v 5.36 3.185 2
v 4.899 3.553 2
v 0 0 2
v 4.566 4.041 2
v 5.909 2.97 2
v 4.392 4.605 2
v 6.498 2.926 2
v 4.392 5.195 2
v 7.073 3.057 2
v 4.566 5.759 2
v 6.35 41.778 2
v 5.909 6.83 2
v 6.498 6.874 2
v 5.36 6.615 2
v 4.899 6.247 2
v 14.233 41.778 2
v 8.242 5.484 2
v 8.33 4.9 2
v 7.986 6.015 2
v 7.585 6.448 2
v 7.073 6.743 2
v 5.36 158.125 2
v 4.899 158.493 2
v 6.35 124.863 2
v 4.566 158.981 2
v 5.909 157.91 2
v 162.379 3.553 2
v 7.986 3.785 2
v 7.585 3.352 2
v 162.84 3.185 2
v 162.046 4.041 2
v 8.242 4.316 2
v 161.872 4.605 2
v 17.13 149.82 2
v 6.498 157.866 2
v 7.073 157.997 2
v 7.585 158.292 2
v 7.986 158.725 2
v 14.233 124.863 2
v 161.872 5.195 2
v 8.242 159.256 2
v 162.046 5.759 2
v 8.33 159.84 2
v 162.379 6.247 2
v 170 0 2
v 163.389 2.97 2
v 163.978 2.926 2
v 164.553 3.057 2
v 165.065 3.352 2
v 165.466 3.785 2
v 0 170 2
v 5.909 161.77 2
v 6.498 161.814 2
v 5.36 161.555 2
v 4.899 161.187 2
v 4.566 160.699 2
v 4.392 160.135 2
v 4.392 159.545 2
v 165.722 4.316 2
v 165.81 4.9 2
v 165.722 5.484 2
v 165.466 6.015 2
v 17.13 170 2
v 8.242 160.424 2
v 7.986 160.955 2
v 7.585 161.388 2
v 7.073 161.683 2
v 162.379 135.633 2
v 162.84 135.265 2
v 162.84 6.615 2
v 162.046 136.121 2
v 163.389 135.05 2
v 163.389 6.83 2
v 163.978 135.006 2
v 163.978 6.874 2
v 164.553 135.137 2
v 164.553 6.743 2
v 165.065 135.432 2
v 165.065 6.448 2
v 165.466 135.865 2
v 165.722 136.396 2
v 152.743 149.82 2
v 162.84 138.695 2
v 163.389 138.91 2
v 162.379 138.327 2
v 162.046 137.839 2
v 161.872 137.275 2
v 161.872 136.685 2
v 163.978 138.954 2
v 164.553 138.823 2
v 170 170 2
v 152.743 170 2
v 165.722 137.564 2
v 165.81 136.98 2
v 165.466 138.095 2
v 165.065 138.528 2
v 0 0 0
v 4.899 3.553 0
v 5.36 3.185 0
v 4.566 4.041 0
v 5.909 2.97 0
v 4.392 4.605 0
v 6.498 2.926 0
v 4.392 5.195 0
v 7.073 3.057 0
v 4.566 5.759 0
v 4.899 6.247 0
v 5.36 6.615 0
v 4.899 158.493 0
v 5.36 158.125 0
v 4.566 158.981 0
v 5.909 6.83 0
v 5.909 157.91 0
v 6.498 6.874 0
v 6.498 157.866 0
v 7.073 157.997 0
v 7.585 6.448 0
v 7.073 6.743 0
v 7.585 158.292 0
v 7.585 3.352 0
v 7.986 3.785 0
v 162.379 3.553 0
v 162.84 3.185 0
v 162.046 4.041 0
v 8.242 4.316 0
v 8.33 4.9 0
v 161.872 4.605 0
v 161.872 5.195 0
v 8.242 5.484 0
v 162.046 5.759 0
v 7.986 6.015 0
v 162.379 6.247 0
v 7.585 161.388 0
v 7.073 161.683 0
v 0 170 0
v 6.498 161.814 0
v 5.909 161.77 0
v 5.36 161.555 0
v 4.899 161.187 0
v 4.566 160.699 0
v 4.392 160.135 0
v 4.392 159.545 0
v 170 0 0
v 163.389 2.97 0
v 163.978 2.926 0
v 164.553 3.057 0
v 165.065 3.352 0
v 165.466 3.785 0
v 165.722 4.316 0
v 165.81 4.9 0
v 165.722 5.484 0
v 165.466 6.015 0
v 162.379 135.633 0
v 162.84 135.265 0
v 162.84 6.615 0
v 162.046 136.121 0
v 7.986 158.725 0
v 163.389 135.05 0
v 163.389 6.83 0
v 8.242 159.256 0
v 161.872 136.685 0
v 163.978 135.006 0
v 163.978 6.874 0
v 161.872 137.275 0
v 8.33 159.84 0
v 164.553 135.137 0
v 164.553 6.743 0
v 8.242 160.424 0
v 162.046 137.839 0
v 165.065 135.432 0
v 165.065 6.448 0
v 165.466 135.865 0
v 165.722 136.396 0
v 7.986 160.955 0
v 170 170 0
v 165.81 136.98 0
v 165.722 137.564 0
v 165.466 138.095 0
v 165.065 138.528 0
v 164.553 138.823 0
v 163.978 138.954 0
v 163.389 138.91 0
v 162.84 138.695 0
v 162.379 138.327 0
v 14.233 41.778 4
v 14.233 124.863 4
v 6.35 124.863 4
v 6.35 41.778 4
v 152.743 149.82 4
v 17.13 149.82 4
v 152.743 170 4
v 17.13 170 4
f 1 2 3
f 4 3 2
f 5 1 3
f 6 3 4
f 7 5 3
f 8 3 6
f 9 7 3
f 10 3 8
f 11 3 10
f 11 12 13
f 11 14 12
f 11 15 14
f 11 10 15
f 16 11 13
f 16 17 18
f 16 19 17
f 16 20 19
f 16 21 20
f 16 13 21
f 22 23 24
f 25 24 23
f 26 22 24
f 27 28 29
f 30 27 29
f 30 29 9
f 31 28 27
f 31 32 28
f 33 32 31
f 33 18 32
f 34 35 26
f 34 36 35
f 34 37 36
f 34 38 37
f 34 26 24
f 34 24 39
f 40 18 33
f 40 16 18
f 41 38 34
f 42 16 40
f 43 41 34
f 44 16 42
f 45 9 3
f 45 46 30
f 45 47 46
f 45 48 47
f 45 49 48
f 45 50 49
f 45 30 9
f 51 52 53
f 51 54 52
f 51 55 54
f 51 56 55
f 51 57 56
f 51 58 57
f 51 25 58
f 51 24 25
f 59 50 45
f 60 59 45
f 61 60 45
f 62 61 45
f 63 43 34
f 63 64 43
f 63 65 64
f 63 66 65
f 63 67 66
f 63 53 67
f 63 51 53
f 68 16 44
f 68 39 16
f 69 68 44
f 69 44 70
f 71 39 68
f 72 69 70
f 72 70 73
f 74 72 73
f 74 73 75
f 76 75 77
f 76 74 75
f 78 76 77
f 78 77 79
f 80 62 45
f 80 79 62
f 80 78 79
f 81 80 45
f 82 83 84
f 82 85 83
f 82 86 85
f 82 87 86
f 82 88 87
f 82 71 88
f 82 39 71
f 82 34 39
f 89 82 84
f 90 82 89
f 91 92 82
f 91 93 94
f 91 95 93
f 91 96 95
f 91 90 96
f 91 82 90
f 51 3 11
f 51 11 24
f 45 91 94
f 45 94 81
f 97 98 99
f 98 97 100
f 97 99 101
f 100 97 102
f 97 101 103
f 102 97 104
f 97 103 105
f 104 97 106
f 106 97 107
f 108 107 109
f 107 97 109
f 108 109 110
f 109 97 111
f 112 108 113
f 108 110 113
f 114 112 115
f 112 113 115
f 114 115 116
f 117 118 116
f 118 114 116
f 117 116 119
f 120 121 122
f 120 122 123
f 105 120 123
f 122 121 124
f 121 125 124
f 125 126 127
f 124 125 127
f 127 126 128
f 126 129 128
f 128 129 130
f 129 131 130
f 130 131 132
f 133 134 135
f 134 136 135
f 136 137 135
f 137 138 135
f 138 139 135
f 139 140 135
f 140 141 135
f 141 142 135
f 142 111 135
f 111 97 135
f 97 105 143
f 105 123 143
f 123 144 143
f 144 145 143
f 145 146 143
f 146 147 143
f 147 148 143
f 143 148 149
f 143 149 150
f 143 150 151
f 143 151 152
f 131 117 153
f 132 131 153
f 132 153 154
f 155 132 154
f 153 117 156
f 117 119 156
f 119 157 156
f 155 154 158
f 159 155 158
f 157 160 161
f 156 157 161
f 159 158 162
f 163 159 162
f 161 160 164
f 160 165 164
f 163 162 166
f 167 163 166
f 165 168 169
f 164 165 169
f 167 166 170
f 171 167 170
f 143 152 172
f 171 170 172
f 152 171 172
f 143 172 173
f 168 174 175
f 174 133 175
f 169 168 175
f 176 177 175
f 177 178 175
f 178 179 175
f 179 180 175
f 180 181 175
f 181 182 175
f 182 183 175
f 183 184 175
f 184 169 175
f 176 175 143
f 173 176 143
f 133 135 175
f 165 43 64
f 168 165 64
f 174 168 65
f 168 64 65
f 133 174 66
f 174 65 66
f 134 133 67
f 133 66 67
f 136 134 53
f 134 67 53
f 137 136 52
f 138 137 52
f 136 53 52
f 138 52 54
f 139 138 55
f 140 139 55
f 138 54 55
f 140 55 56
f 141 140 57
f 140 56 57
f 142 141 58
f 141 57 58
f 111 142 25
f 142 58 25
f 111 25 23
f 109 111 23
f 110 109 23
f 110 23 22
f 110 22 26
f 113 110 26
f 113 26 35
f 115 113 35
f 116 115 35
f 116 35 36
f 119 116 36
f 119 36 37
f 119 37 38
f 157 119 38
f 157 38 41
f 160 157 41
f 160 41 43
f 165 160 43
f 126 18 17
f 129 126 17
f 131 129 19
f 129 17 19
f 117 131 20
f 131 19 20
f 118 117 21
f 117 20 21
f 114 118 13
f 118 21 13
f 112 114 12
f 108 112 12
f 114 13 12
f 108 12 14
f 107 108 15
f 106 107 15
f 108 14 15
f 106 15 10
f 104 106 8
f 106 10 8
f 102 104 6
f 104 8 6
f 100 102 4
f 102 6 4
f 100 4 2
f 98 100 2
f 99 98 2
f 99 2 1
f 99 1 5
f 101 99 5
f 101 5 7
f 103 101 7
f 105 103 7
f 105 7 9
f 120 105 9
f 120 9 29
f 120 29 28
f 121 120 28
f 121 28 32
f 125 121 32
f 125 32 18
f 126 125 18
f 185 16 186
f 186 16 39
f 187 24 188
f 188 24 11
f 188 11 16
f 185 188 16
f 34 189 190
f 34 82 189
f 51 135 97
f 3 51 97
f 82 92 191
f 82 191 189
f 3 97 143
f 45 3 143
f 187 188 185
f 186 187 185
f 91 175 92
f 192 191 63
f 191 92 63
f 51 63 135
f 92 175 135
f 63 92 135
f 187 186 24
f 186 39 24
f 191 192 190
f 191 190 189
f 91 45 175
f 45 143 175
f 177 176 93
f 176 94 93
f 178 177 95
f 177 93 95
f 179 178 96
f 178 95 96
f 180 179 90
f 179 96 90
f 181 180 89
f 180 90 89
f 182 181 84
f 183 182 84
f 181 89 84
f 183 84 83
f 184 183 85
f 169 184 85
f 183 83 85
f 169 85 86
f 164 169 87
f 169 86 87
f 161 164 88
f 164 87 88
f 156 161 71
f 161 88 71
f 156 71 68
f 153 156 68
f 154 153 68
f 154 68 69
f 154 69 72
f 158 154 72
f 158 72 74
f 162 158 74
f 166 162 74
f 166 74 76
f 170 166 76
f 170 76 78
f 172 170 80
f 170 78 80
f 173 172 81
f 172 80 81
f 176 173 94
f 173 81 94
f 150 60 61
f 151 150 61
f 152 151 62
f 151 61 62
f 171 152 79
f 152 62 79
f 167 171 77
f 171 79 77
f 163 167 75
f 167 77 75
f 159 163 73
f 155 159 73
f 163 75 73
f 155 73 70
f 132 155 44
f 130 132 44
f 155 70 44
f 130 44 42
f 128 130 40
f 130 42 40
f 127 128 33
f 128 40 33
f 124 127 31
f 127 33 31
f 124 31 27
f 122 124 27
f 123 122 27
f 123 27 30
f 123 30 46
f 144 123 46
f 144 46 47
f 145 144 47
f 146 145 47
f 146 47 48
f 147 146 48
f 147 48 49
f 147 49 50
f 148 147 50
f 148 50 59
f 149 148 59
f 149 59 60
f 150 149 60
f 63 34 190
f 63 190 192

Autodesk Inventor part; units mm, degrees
ref_plane "YZ Plane" through (0, 0, 0) normal (1, 0, 0) x (0, 1, 0)
ref_plane "XZ Plane" through (0, 0, 0) normal (0, 1, 0) x (-1, 0, 0)
ref_plane "XY Plane" through (0, 0, 0) normal (0, 0, 1) x (1, 0, 0)
sketch "Sketch1" plane through (0, 0, 0) normal (0, 0, 1) x (1, 0, 0)
  line L0 (0, 0) -> (170, 0)
  line L1 (170, 0) -> (170, 170)
  line L2 (170, 170) -> (0, 170)
  line L3 (0, 170) -> (0, 0)
  dimension "d0" = 170
  dimension "d1" = 170
extrude "Extrusion1" add sketch "Sketch1" along normal blind 2
sketch "Sketch2" plane through (0, 0, 2) normal (0, 0, 1) x (1, 0, 0)
  line L0 (170, 170) -> (0, 170) projected
  line L1 (0, 170) -> (0, 0) projected
  line L2 (0, 170) -> (0, 159.84) construction
  line L3 (0, 159.84) -> (6.35, 159.84) construction
  line L4 (6.35, 170) -> (163.83, 170) construction
  line L5 (163.83, 170) -> (163.83, 136.98) construction
  line L6 (6.35, 159.84) -> (6.35, 4.9) construction
  line L7 (6.35, 4.9) -> (163.83, 4.9) construction
  circle A0 centre (6.35, 159.84) radius 1.98
  circle A1 centre (163.83, 136.98) radius 1.98
  circle A2 centre (6.35, 4.9) radius 1.98
  circle A3 centre (163.83, 4.9) radius 1.98
  dimension "d4" = 10.16
  dimension "d5" = 6.35
  dimension "d6" = 157.48
  dimension "d7" = 33.02
  dimension "d8" = 154.94
  dimension "d9" = 3.96
  dimension "d10" = 3.96
  dimension "d11" = 3.96
  dimension "d12" = 3.96
extrude "Extrusion2" cut sketch "Sketch2" against normal blind 2
sketch "Sketch3" plane through (0, 0, 2) normal (0, 0, 1) x (1, 0, 0)
  line L0 (14.2327, 124.8626) -> (6.35, 124.8626)
  line L1 (6.35, 124.8626) -> (6.35, 41.7782)
  line L2 (6.35, 41.7782) -> (14.2327, 41.7782)
  line L3 (14.2327, 41.7782) -> (14.2327, 124.8626)
extrude "Extrusion3" add sketch "Sketch3" along normal blind 2
sketch "Sketch4" plane through (0, 0, 4) normal (0, 0, 1) x (1, 0, 0)
  line L0 (14.2327, 124.8626) -> (6.35, 124.8626) projected
  line L1 (6.35, 124.8626) -> (6.35, 41.7782) projected
  line L2 (6.35, 41.7782) -> (14.2327, 41.7782) projected
  line L3 (14.2327, 41.7782) -> (14.2327, 124.8626) projected
  line L4 (12.3491, 93.2345) -> (12.3491, 74.2867) construction
  line L5 (12.3491, 74.2867) -> (8.2093, 74.2867) construction
  line L6 (8.2093, 74.2867) -> (8.2093, 93.2345) construction
  line L7 (8.2093, 93.2345) -> (12.3491, 93.2345) construction
  point P0 (0, 0)
sketch "Sketch5" plane through (0, 0, 2) normal (0, 0, 1) x (1, 0, 0)
  line L0 (170, 170) -> (0, 170) projected
  line L1 (17.1297, 170) -> (152.7432, 170)
  line L2 (152.7432, 170) -> (152.7432, 149.8199)
  line L3 (152.7432, 149.8199) -> (17.1297, 149.8199)
  line L4 (17.1297, 149.8199) -> (17.1297, 170)
extrude "Extrusion4" add sketch "Sketch5" along normal blind 2
sketch "Sketch6" plane through (0, 0, 4) normal (0, 0, 1) x (1, 0, 0)
  line L0 (17.1297, 170) -> (17.1297, 149.8199) projected
  line L1 (17.1297, 149.8199) -> (152.7432, 149.8199) projected
  line L2 (152.7432, 149.8199) -> (152.7432, 170) projected
  line L3 (152.7432, 170) -> (17.1297, 170) projected
  line L4 (74.7193, 163.8007) -> (99.6305, 163.8007) construction
  line L5 (99.6305, 163.8007) -> (99.6305, 158.8439) construction
  line L6 (99.6305, 158.8439) -> (74.7193, 158.8439) construction
  line L7 (74.7193, 158.8439) -> (74.7193, 163.8007) construction
  point P0 (0, 0)
properties part number "mini itx motherboard"
